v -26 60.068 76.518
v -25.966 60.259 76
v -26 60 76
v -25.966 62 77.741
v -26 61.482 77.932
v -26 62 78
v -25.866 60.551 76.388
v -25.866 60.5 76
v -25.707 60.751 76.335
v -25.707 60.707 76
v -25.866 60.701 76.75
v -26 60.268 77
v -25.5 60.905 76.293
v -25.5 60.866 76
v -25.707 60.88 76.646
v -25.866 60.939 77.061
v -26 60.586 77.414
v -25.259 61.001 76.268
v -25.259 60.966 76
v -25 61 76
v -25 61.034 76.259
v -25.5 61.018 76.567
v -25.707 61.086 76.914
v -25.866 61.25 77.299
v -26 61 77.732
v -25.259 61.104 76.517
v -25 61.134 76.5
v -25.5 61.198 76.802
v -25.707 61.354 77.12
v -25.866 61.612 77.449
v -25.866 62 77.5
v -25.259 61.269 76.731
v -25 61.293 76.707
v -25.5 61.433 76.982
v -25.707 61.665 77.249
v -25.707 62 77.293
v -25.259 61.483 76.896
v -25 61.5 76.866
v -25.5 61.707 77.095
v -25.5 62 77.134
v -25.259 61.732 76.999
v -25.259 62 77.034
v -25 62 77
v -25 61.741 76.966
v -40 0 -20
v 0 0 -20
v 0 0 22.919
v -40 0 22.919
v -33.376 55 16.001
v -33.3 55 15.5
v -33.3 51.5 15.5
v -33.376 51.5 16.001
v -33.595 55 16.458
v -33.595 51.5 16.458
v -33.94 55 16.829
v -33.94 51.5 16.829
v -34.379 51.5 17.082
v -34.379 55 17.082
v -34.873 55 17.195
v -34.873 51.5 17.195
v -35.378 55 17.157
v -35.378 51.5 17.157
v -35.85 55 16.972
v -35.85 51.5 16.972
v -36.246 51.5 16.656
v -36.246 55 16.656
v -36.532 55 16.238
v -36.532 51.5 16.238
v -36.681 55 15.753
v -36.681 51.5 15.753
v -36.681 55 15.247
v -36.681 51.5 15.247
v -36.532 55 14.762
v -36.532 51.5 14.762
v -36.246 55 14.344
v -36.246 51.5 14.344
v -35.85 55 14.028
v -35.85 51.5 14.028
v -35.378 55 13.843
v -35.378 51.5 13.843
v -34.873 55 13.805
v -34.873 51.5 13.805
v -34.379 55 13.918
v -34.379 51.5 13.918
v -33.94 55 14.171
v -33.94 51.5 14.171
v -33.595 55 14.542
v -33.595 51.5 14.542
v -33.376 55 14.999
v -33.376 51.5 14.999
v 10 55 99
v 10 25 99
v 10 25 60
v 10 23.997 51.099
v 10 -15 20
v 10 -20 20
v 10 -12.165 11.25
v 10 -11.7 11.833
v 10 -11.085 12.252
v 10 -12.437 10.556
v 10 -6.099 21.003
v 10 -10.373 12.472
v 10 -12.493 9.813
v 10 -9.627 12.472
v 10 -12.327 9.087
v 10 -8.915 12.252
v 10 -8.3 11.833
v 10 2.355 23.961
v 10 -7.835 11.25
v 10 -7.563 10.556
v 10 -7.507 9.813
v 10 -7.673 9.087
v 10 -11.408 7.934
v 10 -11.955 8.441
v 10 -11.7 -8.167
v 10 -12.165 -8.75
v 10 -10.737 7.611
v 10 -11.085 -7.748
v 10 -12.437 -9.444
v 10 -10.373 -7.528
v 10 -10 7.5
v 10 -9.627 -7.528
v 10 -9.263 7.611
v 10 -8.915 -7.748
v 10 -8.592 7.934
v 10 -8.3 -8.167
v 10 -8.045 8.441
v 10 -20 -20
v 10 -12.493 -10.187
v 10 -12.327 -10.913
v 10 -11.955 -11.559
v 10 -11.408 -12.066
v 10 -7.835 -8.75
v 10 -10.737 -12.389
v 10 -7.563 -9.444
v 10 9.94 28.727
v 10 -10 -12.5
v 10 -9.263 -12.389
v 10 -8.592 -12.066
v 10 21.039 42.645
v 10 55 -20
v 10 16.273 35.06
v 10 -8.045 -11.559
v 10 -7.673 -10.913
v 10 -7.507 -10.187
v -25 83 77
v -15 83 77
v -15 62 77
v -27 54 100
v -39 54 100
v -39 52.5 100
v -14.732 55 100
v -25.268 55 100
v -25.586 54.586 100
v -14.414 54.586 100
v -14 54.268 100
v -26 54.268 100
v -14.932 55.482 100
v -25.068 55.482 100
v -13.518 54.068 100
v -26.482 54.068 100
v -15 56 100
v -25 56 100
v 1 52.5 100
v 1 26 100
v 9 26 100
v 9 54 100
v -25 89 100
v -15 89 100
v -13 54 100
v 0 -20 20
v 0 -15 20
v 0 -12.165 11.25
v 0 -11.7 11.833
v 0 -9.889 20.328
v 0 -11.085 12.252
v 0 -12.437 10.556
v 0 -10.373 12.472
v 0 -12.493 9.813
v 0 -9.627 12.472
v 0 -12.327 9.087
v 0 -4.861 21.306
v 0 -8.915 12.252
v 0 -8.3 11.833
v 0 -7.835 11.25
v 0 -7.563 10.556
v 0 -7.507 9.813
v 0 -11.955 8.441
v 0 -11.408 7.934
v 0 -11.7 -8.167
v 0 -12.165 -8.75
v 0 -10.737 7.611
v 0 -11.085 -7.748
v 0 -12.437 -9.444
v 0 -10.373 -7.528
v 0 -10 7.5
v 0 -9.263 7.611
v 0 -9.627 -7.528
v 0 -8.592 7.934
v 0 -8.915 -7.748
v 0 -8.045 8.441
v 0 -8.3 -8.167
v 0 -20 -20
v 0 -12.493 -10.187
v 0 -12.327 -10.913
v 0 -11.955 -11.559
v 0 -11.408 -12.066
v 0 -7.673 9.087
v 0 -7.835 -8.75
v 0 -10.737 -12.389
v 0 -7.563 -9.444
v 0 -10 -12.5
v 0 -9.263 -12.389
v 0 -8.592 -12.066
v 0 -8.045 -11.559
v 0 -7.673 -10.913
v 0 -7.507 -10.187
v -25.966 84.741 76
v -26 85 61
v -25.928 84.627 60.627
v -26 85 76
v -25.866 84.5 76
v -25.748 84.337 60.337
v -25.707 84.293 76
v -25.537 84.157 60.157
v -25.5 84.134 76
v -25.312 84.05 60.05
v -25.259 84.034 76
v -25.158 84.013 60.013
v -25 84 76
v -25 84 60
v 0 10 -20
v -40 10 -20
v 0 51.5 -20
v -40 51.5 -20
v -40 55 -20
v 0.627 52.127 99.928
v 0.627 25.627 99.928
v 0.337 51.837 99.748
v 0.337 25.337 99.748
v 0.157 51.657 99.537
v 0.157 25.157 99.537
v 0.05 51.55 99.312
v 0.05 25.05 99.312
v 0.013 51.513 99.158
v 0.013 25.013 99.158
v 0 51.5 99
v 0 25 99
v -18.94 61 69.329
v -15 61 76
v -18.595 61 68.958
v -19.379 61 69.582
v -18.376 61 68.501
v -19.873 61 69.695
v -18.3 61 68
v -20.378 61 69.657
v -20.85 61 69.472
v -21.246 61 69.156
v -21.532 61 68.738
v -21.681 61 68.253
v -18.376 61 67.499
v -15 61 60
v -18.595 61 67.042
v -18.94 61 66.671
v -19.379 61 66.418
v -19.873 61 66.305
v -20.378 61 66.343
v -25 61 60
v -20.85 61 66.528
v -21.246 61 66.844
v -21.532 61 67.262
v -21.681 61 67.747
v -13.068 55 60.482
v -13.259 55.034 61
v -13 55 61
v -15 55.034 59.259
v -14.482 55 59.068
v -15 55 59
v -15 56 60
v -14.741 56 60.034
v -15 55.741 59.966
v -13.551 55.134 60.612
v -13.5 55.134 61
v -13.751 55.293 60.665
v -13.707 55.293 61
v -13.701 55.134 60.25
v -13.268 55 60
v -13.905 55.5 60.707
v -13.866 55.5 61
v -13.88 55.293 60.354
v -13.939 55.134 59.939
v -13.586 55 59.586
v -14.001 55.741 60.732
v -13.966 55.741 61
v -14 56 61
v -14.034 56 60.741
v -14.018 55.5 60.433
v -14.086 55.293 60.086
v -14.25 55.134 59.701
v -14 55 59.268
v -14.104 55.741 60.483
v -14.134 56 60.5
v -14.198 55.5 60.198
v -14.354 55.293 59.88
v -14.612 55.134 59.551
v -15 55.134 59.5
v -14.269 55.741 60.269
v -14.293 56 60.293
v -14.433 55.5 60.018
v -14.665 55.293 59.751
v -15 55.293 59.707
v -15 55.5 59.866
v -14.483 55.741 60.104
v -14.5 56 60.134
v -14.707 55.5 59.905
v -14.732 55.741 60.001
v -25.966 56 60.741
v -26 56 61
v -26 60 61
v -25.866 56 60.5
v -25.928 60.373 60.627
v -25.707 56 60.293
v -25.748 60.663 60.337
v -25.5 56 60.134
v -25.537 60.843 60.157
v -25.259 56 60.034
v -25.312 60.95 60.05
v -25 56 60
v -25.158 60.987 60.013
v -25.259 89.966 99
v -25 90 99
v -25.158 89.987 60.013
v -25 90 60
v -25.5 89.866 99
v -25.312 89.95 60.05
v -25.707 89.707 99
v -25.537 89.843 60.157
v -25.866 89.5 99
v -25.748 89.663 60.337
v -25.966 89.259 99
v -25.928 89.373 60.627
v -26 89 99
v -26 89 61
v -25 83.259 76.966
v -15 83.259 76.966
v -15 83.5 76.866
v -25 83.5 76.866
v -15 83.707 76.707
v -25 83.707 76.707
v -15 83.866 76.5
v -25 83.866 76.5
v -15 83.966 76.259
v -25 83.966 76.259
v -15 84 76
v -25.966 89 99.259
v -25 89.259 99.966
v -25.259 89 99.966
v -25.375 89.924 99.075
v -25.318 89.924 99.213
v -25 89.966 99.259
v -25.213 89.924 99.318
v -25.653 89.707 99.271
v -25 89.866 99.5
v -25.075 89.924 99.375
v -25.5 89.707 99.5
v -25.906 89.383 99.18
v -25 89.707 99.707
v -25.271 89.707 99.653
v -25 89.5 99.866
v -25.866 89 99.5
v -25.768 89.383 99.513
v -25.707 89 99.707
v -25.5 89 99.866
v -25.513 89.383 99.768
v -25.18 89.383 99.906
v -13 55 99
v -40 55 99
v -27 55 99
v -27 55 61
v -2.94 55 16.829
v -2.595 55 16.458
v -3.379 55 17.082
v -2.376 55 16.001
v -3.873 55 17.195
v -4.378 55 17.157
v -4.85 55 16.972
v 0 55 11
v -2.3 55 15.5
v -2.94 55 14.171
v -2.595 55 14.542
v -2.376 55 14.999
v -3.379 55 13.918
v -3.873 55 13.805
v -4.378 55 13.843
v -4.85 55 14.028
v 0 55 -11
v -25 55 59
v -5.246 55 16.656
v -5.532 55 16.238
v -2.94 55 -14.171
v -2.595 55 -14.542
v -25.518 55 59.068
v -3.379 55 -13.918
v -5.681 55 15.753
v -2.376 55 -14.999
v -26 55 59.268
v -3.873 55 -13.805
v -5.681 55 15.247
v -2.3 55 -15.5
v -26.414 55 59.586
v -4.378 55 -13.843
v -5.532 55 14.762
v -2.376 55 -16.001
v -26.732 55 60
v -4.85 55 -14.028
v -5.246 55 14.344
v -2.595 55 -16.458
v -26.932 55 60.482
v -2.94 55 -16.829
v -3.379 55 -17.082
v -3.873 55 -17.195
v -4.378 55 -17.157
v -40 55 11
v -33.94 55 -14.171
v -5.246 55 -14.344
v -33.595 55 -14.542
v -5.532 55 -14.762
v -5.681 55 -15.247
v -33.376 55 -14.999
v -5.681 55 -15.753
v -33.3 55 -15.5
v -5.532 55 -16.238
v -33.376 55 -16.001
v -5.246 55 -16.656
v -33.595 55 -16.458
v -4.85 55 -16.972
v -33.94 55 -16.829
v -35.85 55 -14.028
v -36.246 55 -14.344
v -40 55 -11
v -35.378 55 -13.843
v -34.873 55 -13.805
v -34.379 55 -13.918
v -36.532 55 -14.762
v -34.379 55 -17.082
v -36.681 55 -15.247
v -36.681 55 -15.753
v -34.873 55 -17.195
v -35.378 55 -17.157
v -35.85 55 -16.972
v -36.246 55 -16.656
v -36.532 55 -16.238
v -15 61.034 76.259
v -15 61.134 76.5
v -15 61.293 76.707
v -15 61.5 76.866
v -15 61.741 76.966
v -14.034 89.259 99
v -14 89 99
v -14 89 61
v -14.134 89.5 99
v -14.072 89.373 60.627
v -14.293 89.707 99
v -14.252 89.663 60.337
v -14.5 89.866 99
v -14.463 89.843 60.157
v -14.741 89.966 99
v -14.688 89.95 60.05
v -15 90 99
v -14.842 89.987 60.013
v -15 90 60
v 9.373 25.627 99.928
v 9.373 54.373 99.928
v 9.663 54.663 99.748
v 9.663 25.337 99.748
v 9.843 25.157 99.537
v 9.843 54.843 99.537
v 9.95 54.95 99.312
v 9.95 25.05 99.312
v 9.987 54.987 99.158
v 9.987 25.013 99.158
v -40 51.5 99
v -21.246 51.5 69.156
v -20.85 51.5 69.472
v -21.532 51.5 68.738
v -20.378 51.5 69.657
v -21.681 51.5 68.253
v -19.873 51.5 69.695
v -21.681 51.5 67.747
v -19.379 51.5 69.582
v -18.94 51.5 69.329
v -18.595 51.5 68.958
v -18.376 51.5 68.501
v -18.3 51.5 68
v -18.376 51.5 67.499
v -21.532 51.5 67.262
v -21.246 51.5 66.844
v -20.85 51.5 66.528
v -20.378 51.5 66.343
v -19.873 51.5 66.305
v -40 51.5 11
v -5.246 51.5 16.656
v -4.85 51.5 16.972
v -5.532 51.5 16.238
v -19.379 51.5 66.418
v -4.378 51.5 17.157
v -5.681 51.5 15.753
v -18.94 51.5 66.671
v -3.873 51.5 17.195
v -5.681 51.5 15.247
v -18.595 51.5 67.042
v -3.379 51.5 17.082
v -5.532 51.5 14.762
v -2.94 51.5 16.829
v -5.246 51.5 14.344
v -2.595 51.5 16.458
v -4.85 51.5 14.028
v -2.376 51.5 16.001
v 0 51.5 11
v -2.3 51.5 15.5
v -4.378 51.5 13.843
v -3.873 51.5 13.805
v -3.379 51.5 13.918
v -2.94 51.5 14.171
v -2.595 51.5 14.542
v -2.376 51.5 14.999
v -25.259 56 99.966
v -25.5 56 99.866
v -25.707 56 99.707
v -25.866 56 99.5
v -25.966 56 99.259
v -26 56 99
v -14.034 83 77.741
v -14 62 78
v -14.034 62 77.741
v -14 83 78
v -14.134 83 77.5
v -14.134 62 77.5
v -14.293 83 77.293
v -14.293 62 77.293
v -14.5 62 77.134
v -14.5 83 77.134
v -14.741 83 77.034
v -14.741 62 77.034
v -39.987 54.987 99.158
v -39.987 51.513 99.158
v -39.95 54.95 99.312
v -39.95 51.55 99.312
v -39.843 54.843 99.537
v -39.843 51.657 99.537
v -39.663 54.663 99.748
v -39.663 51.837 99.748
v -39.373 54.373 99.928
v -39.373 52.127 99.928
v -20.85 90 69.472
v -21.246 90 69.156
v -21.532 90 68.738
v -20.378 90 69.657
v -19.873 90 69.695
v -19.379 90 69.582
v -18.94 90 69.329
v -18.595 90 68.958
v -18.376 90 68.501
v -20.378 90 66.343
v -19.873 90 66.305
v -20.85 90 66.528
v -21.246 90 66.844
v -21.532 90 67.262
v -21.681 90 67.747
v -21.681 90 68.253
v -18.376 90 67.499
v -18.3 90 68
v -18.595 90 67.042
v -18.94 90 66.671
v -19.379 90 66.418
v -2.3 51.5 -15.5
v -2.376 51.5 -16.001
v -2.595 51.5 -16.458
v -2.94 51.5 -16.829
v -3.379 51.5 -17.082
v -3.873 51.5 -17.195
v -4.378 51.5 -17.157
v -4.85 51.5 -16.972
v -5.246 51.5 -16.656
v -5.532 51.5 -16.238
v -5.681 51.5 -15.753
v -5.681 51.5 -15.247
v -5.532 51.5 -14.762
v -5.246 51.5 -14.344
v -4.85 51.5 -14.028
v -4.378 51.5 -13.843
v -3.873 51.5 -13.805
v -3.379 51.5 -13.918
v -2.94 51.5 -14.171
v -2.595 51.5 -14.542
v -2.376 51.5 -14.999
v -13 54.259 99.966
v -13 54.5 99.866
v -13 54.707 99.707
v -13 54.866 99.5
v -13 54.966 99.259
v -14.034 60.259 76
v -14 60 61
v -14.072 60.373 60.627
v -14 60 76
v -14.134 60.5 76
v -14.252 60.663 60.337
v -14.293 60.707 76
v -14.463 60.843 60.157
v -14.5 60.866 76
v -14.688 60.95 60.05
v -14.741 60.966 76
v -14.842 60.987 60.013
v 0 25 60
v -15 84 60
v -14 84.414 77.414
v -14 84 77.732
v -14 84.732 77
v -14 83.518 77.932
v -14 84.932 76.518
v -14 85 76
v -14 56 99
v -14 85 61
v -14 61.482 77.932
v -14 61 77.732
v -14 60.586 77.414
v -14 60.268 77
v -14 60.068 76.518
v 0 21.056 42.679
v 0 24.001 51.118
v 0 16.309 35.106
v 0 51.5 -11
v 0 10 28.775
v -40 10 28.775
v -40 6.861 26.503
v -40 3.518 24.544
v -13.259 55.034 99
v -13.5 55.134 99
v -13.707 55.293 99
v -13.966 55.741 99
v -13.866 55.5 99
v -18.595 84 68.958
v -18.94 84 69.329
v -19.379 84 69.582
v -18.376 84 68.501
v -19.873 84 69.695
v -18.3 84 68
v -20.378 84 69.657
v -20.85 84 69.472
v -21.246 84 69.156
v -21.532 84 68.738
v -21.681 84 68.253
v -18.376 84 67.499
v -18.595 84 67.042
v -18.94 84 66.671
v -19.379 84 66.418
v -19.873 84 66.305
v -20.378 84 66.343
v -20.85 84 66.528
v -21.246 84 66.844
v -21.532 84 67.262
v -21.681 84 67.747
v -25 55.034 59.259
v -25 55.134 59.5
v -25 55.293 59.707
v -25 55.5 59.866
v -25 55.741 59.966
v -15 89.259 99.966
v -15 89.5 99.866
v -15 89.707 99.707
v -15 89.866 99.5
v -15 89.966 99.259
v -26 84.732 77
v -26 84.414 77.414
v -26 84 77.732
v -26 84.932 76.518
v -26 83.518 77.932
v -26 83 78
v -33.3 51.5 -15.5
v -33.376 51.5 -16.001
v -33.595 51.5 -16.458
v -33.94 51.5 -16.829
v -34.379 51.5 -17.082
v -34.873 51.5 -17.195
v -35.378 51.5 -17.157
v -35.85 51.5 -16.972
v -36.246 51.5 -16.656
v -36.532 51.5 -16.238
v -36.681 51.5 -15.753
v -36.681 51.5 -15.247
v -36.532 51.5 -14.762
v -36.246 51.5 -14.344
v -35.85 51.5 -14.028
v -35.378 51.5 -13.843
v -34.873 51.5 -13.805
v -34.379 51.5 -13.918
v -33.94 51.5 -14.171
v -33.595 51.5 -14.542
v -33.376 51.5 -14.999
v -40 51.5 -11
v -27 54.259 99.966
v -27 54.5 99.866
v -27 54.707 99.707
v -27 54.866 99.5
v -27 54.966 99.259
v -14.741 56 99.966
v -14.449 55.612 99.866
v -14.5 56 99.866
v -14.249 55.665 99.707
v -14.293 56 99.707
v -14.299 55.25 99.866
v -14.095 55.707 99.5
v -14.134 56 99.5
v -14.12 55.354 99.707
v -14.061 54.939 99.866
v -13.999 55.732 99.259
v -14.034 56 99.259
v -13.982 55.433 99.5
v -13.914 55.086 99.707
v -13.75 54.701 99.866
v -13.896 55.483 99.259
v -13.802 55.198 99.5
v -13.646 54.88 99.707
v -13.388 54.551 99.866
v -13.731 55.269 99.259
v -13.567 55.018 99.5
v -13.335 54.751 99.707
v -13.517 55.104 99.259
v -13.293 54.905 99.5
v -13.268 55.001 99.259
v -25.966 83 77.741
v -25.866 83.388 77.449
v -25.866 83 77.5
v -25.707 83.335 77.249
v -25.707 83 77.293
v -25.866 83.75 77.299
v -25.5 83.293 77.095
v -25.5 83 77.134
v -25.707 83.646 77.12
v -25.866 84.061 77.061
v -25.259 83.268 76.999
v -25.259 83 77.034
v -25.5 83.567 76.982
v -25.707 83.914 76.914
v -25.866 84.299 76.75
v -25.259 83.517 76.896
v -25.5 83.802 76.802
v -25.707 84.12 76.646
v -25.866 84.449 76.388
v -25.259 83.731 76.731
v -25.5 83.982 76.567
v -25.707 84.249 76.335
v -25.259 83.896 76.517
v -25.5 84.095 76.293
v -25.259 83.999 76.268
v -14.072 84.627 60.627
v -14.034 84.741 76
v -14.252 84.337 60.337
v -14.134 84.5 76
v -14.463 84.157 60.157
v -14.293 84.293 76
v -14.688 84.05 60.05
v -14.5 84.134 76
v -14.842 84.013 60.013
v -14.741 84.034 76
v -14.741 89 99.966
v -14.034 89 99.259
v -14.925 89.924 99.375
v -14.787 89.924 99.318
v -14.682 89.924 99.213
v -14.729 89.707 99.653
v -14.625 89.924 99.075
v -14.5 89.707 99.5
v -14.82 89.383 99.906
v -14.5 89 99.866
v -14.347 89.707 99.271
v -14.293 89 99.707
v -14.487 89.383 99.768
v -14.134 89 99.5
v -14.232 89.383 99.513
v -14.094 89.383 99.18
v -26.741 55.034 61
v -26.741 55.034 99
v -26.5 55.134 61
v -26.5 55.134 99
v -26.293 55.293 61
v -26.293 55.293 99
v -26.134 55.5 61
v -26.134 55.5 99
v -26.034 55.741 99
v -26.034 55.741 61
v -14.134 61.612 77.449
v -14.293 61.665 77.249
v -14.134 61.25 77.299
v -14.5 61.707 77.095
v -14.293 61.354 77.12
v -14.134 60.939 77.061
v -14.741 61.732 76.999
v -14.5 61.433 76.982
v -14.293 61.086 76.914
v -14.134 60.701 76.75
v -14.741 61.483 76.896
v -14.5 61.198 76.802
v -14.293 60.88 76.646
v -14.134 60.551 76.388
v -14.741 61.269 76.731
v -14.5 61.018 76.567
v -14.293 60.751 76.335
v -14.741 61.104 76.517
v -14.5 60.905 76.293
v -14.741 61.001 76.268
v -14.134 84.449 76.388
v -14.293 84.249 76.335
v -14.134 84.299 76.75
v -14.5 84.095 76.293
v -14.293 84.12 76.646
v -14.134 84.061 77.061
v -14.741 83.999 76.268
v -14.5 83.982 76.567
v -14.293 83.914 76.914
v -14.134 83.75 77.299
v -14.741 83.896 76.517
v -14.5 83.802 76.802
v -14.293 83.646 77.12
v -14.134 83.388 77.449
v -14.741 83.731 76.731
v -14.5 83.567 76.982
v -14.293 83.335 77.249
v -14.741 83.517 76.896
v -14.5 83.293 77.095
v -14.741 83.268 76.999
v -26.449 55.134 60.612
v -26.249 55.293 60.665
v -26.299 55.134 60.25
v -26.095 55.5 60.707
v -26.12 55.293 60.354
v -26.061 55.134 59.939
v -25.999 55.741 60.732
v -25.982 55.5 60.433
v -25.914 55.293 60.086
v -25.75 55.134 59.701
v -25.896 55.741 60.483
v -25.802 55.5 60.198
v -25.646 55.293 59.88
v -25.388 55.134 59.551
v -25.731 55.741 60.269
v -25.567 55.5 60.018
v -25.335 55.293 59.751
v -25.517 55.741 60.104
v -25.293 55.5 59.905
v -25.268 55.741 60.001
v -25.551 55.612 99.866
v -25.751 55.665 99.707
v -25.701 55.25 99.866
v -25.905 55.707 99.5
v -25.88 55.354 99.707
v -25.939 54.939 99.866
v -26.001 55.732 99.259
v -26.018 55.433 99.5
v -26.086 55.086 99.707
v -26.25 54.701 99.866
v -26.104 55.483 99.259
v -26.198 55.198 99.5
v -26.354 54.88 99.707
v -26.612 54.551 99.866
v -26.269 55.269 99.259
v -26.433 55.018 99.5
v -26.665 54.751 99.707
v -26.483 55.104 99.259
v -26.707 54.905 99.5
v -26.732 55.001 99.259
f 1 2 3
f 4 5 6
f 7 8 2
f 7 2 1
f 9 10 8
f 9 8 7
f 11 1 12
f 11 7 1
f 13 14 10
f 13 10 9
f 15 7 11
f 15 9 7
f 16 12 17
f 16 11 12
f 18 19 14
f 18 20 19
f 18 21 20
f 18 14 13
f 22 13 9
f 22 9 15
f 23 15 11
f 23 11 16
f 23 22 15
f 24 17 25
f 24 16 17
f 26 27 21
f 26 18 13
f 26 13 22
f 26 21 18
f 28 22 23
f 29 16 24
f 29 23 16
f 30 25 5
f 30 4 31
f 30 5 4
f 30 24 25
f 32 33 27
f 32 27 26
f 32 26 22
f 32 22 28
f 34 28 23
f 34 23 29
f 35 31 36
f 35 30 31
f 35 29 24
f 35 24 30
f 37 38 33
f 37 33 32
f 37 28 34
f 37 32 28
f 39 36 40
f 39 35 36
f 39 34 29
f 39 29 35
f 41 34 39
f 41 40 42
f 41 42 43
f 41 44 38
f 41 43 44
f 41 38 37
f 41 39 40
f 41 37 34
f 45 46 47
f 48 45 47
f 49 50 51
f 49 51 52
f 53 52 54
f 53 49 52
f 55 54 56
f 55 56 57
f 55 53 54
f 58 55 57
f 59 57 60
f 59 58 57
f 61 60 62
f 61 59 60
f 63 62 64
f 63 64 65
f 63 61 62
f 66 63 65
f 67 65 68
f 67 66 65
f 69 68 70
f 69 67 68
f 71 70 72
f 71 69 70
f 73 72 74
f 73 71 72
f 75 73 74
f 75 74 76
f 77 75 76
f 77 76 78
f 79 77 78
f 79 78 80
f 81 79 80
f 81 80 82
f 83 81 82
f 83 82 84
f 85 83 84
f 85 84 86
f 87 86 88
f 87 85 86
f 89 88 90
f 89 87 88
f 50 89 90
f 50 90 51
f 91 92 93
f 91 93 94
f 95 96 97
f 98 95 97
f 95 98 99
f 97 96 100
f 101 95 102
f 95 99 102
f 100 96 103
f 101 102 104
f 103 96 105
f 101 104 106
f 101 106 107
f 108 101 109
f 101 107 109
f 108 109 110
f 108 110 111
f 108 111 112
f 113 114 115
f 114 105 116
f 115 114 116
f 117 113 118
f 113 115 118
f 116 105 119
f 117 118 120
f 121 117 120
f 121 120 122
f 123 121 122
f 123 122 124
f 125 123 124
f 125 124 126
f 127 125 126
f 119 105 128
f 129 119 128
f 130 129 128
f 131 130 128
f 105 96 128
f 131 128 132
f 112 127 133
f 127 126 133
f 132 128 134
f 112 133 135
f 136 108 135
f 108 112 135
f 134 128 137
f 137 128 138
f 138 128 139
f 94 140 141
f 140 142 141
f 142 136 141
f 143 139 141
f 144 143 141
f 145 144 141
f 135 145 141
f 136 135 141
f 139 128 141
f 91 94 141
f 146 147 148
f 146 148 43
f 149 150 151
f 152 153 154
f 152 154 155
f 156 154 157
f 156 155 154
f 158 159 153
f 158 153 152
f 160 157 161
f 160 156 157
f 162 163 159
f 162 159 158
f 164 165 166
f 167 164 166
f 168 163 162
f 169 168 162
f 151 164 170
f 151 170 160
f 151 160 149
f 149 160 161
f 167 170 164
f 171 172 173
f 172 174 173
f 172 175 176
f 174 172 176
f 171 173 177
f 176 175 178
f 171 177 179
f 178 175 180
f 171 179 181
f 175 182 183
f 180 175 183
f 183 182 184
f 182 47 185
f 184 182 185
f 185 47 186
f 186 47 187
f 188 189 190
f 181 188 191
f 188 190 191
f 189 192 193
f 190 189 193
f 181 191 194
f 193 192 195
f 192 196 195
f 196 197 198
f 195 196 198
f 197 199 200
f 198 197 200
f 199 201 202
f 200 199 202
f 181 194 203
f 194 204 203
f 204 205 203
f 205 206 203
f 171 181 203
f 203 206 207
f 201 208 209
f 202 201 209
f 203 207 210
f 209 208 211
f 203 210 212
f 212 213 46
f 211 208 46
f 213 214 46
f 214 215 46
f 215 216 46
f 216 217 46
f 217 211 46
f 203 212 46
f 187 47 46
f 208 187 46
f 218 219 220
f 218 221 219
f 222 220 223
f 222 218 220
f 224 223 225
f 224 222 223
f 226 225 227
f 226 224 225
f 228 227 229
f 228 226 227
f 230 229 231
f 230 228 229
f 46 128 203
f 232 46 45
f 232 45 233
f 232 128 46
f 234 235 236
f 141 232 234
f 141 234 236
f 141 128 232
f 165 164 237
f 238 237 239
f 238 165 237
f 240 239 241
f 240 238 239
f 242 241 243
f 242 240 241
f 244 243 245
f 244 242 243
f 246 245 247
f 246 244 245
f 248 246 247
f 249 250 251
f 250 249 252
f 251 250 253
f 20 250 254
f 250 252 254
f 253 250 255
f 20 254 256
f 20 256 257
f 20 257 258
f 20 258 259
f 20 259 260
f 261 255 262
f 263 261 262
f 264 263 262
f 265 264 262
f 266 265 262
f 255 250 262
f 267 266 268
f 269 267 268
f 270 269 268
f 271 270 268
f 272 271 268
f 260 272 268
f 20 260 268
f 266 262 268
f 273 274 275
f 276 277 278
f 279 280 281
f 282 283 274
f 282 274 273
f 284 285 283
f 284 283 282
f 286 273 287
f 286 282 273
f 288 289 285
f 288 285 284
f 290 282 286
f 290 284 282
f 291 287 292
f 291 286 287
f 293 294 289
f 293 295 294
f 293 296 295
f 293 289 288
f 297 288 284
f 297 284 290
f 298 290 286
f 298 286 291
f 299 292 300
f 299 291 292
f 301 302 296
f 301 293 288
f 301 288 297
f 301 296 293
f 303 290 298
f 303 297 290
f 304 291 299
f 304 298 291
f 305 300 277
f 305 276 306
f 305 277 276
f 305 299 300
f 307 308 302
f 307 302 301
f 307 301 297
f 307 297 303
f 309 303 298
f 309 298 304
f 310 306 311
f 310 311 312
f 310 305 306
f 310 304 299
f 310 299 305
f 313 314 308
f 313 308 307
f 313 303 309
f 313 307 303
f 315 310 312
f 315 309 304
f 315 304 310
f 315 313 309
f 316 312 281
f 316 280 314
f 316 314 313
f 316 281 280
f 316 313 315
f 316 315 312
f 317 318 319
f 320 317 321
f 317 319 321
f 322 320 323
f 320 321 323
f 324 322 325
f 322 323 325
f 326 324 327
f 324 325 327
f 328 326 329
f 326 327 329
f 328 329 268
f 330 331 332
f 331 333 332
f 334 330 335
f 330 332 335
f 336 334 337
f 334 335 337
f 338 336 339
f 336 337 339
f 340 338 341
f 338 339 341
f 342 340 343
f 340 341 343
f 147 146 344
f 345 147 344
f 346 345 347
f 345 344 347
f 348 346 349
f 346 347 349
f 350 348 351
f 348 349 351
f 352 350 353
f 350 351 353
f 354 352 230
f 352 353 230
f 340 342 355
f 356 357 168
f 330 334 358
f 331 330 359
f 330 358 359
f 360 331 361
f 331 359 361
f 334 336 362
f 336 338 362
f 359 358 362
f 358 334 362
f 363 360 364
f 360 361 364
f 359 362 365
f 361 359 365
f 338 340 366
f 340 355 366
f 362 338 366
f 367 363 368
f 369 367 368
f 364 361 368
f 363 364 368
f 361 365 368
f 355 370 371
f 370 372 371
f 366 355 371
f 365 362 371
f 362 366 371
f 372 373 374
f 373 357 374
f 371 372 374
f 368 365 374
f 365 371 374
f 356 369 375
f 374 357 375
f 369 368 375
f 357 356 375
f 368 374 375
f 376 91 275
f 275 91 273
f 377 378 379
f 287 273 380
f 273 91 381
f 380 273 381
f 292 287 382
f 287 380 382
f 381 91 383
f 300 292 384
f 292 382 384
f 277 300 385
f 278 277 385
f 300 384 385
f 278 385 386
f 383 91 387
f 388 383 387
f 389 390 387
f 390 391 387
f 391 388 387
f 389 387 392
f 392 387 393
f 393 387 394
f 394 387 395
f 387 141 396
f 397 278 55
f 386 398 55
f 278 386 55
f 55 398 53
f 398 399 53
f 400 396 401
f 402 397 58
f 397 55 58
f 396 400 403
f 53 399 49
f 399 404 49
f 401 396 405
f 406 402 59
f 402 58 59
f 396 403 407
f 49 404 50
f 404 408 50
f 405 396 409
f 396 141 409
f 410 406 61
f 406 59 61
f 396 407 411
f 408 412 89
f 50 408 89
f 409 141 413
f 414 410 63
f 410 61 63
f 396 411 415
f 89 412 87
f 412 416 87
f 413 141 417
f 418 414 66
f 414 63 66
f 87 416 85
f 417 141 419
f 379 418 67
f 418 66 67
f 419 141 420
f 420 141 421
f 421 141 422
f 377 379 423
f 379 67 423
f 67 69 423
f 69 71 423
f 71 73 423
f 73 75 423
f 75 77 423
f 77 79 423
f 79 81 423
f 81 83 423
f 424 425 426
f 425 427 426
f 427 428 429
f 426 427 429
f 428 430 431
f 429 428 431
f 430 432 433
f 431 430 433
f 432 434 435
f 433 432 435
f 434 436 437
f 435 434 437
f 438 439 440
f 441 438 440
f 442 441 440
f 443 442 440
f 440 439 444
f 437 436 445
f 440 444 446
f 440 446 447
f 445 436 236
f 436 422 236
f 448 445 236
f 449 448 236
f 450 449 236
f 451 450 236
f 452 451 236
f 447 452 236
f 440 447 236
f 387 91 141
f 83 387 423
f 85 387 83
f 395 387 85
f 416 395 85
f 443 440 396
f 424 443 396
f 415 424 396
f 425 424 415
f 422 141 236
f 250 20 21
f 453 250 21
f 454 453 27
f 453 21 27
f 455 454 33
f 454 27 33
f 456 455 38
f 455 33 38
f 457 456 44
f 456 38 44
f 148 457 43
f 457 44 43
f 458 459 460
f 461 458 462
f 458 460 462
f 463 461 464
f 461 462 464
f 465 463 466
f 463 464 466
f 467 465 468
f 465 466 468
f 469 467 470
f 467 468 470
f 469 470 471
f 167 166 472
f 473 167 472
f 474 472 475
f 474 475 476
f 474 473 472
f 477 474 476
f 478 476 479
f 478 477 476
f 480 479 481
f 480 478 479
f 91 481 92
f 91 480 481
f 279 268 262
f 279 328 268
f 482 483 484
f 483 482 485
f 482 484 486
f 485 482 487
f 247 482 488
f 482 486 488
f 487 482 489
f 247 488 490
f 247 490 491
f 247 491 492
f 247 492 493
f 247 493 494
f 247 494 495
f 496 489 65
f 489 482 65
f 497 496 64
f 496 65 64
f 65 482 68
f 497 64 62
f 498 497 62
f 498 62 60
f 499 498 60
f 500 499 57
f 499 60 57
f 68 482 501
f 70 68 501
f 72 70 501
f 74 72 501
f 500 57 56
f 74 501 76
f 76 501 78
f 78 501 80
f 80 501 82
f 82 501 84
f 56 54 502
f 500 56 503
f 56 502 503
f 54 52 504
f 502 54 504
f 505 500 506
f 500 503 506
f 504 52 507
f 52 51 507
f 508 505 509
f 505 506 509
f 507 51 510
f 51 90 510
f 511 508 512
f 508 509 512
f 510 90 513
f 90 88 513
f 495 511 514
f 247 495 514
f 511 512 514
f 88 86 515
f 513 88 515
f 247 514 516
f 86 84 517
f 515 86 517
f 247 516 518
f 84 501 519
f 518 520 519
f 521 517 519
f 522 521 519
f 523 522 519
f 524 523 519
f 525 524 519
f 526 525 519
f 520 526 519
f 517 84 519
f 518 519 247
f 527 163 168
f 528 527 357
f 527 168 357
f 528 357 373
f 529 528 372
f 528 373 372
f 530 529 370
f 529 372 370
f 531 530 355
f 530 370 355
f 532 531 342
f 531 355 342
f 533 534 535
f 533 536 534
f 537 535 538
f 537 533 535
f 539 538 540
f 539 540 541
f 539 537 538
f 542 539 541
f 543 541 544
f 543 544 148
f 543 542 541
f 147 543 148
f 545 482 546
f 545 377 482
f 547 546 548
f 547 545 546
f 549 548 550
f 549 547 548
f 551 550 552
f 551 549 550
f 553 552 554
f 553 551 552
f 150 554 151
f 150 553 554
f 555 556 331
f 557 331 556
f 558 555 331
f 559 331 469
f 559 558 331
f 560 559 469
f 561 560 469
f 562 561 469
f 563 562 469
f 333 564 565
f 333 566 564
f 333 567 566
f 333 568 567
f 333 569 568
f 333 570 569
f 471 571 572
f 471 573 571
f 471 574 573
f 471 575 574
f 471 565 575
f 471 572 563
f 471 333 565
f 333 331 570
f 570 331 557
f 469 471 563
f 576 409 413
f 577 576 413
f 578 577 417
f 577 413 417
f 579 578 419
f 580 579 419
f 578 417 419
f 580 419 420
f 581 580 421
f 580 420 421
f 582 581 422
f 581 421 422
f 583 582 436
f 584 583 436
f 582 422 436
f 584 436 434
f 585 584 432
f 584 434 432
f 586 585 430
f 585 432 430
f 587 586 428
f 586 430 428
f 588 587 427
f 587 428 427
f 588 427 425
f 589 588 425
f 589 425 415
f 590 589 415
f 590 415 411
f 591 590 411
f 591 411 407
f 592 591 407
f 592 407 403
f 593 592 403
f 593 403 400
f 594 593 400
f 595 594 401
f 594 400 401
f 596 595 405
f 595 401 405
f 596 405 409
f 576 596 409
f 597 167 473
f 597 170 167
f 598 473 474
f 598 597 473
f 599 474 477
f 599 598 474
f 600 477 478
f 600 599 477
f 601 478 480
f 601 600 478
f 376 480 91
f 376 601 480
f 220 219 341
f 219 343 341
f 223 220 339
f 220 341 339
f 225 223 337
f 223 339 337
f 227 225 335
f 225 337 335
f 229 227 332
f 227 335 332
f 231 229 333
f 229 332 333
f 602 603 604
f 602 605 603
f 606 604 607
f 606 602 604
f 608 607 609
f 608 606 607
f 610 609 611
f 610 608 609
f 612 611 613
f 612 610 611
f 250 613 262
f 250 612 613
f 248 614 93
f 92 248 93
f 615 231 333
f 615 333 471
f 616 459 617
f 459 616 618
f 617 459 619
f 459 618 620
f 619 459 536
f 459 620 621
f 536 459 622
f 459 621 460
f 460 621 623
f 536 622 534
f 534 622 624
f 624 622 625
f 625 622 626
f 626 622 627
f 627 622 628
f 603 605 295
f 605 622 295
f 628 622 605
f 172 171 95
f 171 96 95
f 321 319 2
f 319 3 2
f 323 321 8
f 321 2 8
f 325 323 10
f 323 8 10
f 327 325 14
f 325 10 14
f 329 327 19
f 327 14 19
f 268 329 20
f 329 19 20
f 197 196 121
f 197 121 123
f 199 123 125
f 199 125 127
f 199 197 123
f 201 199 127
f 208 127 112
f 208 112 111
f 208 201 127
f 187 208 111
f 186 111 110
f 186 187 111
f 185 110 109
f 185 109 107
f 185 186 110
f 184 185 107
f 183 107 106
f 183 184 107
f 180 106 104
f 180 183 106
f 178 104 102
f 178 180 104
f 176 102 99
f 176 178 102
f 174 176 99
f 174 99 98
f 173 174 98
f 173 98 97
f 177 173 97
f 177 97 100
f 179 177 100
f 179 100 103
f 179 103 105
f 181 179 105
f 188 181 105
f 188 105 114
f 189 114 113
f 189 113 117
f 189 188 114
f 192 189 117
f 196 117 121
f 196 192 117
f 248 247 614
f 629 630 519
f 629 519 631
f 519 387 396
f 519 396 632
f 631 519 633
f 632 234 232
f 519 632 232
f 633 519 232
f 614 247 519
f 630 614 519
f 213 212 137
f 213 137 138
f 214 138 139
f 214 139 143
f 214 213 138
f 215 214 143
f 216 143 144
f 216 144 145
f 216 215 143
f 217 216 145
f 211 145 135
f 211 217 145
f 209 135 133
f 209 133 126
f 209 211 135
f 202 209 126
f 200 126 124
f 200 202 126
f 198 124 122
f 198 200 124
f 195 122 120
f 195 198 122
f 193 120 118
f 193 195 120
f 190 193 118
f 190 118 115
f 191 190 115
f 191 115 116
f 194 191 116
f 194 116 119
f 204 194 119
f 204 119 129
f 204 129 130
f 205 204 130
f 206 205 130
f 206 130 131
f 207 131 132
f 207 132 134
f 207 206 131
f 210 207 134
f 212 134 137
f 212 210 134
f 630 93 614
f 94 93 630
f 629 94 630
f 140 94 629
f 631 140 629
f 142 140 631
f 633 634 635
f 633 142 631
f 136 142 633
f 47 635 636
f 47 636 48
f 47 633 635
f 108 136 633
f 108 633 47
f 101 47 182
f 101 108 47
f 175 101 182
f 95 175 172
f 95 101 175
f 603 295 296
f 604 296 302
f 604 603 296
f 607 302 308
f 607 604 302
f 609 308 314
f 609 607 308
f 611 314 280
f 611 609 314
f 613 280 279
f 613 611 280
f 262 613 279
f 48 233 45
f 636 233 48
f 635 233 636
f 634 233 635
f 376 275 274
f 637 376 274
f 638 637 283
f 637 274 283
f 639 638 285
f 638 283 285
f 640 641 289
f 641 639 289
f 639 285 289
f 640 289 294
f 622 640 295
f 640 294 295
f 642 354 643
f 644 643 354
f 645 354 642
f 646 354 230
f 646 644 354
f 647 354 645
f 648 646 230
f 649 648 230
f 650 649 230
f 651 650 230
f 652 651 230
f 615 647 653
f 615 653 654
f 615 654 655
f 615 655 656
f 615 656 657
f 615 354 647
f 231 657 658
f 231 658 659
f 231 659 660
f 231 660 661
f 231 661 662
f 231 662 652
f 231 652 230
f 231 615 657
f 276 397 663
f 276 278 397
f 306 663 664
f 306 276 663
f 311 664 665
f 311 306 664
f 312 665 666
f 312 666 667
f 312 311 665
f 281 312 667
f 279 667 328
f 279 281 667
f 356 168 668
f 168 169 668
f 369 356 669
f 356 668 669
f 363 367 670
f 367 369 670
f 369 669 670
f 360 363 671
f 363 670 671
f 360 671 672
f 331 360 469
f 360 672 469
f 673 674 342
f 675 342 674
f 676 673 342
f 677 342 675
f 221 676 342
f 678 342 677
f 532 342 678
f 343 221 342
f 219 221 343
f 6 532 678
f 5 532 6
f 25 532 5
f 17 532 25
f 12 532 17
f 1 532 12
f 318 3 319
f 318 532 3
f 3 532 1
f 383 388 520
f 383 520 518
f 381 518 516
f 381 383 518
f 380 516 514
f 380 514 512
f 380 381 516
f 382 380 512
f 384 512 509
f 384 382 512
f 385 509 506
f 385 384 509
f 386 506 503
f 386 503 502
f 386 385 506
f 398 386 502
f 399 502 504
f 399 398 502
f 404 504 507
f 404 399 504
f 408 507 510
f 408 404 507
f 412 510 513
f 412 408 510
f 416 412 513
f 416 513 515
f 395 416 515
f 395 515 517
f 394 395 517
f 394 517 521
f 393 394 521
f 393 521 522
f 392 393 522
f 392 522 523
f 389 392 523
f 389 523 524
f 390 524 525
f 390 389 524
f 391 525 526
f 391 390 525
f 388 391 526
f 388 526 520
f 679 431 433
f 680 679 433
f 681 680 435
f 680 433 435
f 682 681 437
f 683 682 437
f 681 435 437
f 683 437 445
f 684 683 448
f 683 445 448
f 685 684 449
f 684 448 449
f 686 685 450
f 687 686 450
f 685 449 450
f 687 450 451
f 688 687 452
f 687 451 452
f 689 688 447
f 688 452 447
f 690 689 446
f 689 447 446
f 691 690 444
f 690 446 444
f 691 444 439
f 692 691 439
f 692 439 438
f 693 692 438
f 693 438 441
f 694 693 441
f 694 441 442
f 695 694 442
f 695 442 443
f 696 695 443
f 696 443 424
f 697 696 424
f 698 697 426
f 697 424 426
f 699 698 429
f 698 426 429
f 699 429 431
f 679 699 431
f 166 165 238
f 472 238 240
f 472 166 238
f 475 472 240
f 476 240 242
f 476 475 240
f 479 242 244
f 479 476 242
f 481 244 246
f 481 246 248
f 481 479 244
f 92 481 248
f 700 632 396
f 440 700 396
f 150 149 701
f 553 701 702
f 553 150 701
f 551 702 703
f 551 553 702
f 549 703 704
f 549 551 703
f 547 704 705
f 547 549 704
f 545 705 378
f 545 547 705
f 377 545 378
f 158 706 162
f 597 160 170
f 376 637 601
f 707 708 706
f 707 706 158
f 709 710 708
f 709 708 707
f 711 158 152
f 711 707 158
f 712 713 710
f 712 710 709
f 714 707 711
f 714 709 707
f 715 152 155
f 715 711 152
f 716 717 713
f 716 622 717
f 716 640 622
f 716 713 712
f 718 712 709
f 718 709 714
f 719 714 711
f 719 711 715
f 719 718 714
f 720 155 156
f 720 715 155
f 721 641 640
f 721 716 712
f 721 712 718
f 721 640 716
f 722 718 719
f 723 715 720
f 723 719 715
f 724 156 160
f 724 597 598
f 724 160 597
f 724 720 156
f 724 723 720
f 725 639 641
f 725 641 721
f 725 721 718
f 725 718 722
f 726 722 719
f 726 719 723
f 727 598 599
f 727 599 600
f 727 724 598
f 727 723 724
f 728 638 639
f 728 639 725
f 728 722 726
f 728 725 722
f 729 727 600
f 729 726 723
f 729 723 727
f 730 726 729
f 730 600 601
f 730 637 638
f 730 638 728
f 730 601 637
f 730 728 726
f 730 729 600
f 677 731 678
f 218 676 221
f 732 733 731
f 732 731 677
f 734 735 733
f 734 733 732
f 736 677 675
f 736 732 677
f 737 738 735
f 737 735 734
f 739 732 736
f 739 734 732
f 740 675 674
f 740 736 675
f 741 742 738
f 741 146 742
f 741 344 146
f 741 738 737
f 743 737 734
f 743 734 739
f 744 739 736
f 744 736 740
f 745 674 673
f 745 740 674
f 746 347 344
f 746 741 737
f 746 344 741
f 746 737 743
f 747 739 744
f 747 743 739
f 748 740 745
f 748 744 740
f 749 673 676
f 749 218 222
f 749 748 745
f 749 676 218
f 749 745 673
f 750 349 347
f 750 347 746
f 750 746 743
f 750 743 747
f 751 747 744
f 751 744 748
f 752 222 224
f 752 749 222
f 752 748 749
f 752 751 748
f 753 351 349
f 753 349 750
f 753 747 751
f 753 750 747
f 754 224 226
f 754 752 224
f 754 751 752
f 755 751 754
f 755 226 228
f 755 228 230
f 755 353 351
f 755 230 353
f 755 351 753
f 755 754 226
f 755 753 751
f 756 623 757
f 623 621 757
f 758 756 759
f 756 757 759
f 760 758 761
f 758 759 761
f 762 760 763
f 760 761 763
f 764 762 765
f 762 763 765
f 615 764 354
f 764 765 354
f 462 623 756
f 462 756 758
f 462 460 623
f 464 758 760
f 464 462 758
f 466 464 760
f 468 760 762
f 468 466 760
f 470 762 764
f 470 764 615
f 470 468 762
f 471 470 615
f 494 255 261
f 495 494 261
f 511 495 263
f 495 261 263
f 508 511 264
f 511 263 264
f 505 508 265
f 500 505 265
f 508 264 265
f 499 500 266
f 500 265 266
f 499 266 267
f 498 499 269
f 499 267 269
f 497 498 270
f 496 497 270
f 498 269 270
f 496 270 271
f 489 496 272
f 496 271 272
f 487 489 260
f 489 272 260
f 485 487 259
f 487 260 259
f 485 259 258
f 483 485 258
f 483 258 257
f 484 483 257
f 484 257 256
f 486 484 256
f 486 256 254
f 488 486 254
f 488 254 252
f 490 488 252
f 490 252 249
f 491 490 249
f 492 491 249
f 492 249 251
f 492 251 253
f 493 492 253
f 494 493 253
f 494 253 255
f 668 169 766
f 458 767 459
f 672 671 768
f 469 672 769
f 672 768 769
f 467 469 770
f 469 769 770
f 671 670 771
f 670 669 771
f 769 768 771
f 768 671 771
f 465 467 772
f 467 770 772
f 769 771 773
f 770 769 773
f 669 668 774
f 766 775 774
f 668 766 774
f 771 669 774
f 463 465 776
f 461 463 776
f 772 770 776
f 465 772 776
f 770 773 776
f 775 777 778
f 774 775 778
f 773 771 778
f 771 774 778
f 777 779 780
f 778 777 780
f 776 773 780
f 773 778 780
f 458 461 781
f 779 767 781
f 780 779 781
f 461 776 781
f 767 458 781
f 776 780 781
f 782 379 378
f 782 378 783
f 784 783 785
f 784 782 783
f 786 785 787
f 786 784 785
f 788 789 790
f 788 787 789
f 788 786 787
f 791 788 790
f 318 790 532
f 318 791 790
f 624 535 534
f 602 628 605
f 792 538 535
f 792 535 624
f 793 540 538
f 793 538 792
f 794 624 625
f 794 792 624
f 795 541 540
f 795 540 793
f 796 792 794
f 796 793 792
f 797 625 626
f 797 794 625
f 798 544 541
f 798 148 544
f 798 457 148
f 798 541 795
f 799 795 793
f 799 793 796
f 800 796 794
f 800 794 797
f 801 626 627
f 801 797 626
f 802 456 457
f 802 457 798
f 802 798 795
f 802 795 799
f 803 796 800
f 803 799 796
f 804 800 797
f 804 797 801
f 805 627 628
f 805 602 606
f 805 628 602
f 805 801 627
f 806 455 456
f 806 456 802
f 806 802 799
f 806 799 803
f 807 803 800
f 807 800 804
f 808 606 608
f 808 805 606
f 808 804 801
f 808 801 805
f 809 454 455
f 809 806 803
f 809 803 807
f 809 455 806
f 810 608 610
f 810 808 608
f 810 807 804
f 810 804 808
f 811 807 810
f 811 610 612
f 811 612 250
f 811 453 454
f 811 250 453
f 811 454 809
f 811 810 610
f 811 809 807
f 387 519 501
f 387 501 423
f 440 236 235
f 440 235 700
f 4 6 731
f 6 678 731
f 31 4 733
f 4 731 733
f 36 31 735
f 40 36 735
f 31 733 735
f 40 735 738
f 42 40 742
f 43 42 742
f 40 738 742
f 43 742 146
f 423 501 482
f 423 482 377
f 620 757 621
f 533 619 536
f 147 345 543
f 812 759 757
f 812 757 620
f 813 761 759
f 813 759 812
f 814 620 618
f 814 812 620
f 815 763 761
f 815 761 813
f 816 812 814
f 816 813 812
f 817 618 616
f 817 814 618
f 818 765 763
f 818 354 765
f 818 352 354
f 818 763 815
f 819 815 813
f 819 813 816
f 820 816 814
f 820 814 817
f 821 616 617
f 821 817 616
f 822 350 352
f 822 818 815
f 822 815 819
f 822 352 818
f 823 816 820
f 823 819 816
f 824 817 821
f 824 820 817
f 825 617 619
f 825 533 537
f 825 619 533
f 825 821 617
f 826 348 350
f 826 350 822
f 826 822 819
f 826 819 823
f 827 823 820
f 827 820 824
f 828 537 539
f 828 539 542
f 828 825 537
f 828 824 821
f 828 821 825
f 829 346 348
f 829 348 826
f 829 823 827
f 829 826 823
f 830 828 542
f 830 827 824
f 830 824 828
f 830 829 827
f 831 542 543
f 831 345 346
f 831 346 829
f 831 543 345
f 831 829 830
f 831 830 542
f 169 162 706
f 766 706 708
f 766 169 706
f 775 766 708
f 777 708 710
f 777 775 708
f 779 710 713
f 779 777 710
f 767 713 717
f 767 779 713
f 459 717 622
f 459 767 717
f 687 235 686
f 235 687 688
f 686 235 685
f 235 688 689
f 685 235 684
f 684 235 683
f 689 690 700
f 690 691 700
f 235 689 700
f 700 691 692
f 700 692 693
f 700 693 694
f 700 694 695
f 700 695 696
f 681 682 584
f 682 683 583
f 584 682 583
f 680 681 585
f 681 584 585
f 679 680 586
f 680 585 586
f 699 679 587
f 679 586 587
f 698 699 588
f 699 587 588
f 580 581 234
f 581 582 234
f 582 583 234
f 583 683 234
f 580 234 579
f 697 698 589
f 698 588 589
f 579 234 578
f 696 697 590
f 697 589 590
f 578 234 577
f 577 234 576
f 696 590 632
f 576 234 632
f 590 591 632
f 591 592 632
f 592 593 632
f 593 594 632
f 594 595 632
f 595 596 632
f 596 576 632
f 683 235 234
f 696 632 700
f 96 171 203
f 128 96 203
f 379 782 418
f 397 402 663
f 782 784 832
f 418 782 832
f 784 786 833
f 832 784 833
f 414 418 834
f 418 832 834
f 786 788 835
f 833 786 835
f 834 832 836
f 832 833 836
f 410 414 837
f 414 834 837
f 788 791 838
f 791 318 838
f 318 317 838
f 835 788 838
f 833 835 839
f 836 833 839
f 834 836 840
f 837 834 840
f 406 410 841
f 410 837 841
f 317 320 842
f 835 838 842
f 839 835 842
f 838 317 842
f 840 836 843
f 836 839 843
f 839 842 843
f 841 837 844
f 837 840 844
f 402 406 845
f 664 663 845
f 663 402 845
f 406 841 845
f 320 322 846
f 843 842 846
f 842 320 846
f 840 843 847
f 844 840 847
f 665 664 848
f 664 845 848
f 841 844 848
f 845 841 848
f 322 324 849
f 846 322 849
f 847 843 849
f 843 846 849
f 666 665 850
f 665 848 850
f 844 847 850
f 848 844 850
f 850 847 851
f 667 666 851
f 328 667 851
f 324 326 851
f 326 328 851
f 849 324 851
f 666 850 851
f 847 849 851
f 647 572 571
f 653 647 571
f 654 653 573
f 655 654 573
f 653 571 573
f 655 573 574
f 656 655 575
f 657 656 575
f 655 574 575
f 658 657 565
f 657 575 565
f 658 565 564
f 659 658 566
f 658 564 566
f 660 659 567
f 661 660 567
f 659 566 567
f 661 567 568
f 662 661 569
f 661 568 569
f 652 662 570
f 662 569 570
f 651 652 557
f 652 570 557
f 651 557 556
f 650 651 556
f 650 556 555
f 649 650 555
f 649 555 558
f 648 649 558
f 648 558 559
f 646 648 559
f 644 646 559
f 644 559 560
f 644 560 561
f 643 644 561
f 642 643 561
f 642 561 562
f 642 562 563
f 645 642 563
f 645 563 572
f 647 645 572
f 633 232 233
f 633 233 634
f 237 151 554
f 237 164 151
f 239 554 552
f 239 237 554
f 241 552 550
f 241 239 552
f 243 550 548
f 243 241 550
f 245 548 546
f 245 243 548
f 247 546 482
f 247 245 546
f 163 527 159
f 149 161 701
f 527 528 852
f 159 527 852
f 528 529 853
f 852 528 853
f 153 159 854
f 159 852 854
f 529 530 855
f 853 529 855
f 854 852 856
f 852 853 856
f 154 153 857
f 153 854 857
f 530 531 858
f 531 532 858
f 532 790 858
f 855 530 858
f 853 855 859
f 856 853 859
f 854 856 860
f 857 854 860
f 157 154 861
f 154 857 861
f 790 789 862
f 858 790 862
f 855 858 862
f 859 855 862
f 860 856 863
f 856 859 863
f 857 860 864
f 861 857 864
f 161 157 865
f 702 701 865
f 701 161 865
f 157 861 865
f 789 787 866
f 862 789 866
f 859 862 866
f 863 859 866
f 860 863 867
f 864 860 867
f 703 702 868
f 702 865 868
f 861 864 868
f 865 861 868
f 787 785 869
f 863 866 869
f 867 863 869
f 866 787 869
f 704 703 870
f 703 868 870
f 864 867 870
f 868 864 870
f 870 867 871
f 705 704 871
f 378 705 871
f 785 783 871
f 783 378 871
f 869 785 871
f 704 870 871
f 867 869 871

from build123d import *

# Parameters (mm, degrees)
SKETCH1_W               = 40
SKETCH1_H               = 55
SKETCH1_H_2             = 20
SKETCH1_R               = 2.5
BOSS_EXTRUDE1_DEPTH     = 10
SKETCH3_W               = 40
SKETCH3_H               = 10
BOSS_EXTRUDE2_DEPTH     = 40
SKETCH4_W               = 9
SKETCH4_H               = 3.5
BOSS_EXTRUDE3_DEPTH     = 40
SKETCH5_R               = 1.7
CUT_EXTRUDE1_DEPTH      = 3.5
SKETCH7_W               = 40
SKETCH7_H               = 3.5
BOSS_EXTRUDE4_DEPTH     = 80
SKETCH8_W               = 12
SKETCH8_H               = 40
BOSS_EXTRUDE5_DEPTH     = 35
SKETCH9_W               = 12
SKETCH9_H               = 23
CUT_EXTRUDE2_DEPTH      = 17
SKETCH10_R              = 1.7
CUT_EXTRUDE3_DEPTH      = 1
CUT_EXTRUDE3_DEPTH_BACK = 38.5
FILLET1_R               = 1
FILLET2_R               = 40


with BuildPart() as part:
    # Sketch1 → Boss-Extrude1 (new body)
    with BuildSketch(Plane(origin=(0, 0, 0), x_dir=(0, 0, -1), z_dir=(1, 0, 0))):
        with Locations((0, 27.5)):
            Rectangle(SKETCH1_W, SKETCH1_H)
        with Locations((0, -10)):
            Rectangle(SKETCH1_W, SKETCH1_H_2)
        with Locations((10, -10)):
            Circle(SKETCH1_R, mode=Mode.SUBTRACT)
        with Locations((-10, -10)):
            Circle(SKETCH1_R, mode=Mode.SUBTRACT)
    extrude(amount=BOSS_EXTRUDE1_DEPTH)

    # Sketch3 → Boss-Extrude2 (add)
    with BuildSketch(Plane.ZY):
        with Locations((0, 5)):
            Rectangle(SKETCH3_W, SKETCH3_H)
    extrude(amount=BOSS_EXTRUDE2_DEPTH)

    # Sketch4 → Boss-Extrude3 (add)
    with BuildSketch(Plane.ZY):
        with Locations((-15.5, 53.25)):
            Rectangle(SKETCH4_W, SKETCH4_H)
    boss_extrude3 = extrude(amount=BOSS_EXTRUDE3_DEPTH)

    # Sketch5 → Cut-Extrude1 (cut)
    with BuildSketch(Plane(origin=(0, 55, 0), x_dir=(1, 0, 0), z_dir=(0, 1, 0))):
        with Locations((-35, 15.5)):
            Circle(SKETCH5_R)
        with Locations((-4, 15.5)):
            Circle(SKETCH5_R)
    cut_extrude1 = extrude(amount=-CUT_EXTRUDE1_DEPTH, mode=Mode.SUBTRACT)

    # Mirror2: Boss-Extrude3, Cut-Extrude1 across plane
    add(boss_extrude3.mirror(Plane.XY))
    add(cut_extrude1.mirror(Plane.XY), mode=Mode.SUBTRACT)

    # Sketch7 → Boss-Extrude4 (add)
    with BuildSketch(Plane.XY.offset(20)):
        with Locations((-20, 53.25)):
            Rectangle(SKETCH7_W, SKETCH7_H)
        Polygon((10, 55), (0, 55), (0, 51.5), (0, 25), (10, 25), align=None)
    extrude(amount=BOSS_EXTRUDE4_DEPTH)

    # Sketch8 → Boss-Extrude5 (add)
    with BuildSketch(Plane(origin=(0, 55, 0), x_dir=(1, 0, 0), z_dir=(0, 1, 0))):
        with Locations((-20, -80)):
            Rectangle(SKETCH8_W, SKETCH8_H)
    extrude(amount=BOSS_EXTRUDE5_DEPTH)

    # Sketch9 → Cut-Extrude2 (cut)
    with BuildSketch(Plane(origin=(0, 0, 60), x_dir=(-1, 0, 0), z_dir=(0, 0, -1))):
        with Locations((20, 72.5)):
            Rectangle(SKETCH9_W, SKETCH9_H)
    extrude(amount=-CUT_EXTRUDE2_DEPTH, mode=Mode.SUBTRACT)

    # Sketch10 → Cut-Extrude3 (cut, two sides)
    with BuildSketch(Plane(origin=(0, 90, 0), x_dir=(1, 0, 0), z_dir=(0, 1, 0))) as cut_extrude3_sk:
        with Locations((-20, -68)):
            Circle(SKETCH10_R)
    extrude(amount=CUT_EXTRUDE3_DEPTH, mode=Mode.SUBTRACT)
    extrude(cut_extrude3_sk.sketch, amount=-CUT_EXTRUDE3_DEPTH_BACK, mode=Mode.SUBTRACT)

    # Fillet1
    fillet1_edges = [part.edges().sort_by_distance(p)[0] for p in [
        (-33, 55, 100),
        (-26, 55, 80),
        (-26, 87, 60),
        (-26, 72.5, 100),
        (-14, 55, 80),
        (-14, 72.5, 100),
        (-20, 55, 60),
        (-14, 87, 60),
        (-26, 90, 80),
        (-20, 90, 100),
        (-14, 90, 80),
        (-26, 58, 60),
        (-14, 58, 60),
        (-14, 72.5, 77),
        (-14, 61, 68.5),
        (-20, 84, 77),
        (-14, 84, 68.5),
        (-26, 72.5, 77),
        (-26, 84, 68.5),
        (-20, 61, 77),
        (-26, 61, 68.5),
        (-20, 51.5, 100),
        (0, 38.25, 100),
        (5, 25, 100),
        (10, 40, 100),
        (-2, 55, 100),
        (-40, 53.25, 100),
    ]]
    fillet(fillet1_edges, radius=FILLET1_R)

    # Fillet2
    fillet2_edges = [part.edges().sort_by_distance(p)[0] for p in [
        (5, 25, 20),
    ]]
    fillet(fillet2_edges, radius=FILLET2_R)


solid = part.part
